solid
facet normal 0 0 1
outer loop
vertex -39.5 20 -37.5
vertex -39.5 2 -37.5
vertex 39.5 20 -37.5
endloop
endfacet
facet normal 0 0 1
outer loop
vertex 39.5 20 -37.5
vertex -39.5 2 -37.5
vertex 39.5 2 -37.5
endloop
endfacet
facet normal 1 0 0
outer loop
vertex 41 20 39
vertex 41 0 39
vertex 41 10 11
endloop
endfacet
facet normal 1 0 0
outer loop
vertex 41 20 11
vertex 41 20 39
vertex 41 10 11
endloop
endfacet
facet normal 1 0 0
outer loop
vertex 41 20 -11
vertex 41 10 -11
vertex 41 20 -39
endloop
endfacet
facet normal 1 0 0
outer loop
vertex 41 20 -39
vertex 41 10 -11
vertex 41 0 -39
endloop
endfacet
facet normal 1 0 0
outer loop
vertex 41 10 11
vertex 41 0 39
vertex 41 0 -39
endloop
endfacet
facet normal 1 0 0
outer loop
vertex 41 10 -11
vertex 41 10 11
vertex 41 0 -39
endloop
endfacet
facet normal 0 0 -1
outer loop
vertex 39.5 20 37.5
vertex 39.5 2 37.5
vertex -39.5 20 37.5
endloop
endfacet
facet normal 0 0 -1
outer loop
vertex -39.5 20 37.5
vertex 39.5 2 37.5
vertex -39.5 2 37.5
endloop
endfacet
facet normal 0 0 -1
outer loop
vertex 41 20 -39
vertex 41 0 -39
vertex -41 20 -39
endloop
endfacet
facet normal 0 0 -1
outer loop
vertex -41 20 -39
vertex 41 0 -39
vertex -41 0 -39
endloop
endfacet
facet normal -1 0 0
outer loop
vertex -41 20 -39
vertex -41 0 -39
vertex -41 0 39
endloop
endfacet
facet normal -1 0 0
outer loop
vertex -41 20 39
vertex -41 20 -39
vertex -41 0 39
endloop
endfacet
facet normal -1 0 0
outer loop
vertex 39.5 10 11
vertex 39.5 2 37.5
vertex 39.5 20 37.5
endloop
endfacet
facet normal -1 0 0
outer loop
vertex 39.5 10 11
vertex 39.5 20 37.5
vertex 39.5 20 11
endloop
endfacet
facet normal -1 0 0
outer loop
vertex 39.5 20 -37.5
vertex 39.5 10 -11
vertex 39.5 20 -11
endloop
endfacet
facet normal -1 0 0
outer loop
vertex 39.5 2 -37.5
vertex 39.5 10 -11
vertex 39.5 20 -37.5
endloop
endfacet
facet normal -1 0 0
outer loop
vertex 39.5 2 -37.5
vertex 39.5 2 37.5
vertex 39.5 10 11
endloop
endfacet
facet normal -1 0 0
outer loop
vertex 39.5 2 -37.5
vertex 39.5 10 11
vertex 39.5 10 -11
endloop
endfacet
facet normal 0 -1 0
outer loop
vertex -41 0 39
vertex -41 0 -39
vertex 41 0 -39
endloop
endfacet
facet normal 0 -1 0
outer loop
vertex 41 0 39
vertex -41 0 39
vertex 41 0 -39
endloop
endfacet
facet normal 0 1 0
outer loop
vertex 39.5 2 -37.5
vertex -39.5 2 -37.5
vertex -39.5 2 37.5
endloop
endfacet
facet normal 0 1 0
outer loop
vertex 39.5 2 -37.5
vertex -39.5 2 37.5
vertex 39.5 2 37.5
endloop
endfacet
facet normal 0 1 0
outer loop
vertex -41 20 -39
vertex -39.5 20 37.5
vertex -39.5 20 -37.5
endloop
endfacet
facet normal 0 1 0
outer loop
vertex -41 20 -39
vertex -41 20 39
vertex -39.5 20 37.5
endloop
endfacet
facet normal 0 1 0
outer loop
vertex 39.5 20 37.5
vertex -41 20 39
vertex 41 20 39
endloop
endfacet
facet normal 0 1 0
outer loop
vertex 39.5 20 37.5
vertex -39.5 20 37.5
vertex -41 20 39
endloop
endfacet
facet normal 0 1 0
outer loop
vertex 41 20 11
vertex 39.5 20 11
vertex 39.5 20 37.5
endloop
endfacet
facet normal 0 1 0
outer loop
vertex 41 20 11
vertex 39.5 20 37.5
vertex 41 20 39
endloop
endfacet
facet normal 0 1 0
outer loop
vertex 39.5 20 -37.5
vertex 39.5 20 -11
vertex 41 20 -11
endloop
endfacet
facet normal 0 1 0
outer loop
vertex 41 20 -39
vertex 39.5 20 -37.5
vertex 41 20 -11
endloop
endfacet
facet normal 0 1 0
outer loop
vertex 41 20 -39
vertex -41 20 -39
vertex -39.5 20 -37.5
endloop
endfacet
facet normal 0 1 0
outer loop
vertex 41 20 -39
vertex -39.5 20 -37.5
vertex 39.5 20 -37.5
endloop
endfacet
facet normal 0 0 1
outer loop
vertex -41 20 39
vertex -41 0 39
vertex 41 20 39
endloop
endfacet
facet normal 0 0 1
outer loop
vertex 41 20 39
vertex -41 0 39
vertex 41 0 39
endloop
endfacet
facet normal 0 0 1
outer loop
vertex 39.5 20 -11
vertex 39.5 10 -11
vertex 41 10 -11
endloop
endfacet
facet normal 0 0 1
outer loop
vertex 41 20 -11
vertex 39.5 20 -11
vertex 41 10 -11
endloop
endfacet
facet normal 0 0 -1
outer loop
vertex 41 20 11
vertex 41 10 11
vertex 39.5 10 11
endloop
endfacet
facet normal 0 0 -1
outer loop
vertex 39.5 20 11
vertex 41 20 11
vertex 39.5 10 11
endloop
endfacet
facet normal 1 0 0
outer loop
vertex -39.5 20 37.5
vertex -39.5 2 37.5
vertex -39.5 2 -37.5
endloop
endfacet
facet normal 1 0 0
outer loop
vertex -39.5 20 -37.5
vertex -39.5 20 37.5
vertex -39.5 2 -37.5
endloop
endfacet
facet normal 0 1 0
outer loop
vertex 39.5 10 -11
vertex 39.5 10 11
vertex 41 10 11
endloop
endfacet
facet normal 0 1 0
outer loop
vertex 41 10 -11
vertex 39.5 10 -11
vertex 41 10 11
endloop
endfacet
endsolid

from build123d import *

# Parameters (mm, degrees)
CROQUIS1_W              = 79
CROQUIS1_H              = 75
SALIENTE_EXTRUIR1_DEPTH = 2
SALIENTE_EXTRUIR3_DEPTH = 20
CROQUIS1_5_W            = 1.5
CROQUIS1_5_H            = 22
SALIENTE_EXTRUIR4_DEPTH = 10


with BuildPart() as part:
    # Croquis1 → Saliente-Extruir1 (new body)
    with BuildSketch(Plane(origin=(0, 0, 0), x_dir=(1, 0, 0), z_dir=(0, 1, 0))):
        Rectangle(CROQUIS1_W, CROQUIS1_H)
    extrude(amount=SALIENTE_EXTRUIR1_DEPTH)

    # Croquis1<4> → Saliente-Extruir3 (add)
    with BuildSketch(Plane(origin=(0, 0, 0), x_dir=(1, 0, 0), z_dir=(0, 1, 0))):
        Polygon((-39.5, -37.5), (-39.5, 37.5), (39.5, 37.5), (39.5, 11), (41, 11), (41, 39), (-41, 39), (-41, -39), (41, -39), (41, -11), (39.5, -11), (39.5, -37.5), align=None)
    extrude(amount=SALIENTE_EXTRUIR3_DEPTH)

    # Croquis1<5> → Saliente-Extruir4 (add)
    with BuildSketch(Plane(origin=(0, 0, 0), x_dir=(1, 0, 0), z_dir=(0, 1, 0))):
        with Locations((40.25, 0)):
            Rectangle(CROQUIS1_5_W, CROQUIS1_5_H)
    extrude(amount=SALIENTE_EXTRUIR4_DEPTH)


solid = part.part
